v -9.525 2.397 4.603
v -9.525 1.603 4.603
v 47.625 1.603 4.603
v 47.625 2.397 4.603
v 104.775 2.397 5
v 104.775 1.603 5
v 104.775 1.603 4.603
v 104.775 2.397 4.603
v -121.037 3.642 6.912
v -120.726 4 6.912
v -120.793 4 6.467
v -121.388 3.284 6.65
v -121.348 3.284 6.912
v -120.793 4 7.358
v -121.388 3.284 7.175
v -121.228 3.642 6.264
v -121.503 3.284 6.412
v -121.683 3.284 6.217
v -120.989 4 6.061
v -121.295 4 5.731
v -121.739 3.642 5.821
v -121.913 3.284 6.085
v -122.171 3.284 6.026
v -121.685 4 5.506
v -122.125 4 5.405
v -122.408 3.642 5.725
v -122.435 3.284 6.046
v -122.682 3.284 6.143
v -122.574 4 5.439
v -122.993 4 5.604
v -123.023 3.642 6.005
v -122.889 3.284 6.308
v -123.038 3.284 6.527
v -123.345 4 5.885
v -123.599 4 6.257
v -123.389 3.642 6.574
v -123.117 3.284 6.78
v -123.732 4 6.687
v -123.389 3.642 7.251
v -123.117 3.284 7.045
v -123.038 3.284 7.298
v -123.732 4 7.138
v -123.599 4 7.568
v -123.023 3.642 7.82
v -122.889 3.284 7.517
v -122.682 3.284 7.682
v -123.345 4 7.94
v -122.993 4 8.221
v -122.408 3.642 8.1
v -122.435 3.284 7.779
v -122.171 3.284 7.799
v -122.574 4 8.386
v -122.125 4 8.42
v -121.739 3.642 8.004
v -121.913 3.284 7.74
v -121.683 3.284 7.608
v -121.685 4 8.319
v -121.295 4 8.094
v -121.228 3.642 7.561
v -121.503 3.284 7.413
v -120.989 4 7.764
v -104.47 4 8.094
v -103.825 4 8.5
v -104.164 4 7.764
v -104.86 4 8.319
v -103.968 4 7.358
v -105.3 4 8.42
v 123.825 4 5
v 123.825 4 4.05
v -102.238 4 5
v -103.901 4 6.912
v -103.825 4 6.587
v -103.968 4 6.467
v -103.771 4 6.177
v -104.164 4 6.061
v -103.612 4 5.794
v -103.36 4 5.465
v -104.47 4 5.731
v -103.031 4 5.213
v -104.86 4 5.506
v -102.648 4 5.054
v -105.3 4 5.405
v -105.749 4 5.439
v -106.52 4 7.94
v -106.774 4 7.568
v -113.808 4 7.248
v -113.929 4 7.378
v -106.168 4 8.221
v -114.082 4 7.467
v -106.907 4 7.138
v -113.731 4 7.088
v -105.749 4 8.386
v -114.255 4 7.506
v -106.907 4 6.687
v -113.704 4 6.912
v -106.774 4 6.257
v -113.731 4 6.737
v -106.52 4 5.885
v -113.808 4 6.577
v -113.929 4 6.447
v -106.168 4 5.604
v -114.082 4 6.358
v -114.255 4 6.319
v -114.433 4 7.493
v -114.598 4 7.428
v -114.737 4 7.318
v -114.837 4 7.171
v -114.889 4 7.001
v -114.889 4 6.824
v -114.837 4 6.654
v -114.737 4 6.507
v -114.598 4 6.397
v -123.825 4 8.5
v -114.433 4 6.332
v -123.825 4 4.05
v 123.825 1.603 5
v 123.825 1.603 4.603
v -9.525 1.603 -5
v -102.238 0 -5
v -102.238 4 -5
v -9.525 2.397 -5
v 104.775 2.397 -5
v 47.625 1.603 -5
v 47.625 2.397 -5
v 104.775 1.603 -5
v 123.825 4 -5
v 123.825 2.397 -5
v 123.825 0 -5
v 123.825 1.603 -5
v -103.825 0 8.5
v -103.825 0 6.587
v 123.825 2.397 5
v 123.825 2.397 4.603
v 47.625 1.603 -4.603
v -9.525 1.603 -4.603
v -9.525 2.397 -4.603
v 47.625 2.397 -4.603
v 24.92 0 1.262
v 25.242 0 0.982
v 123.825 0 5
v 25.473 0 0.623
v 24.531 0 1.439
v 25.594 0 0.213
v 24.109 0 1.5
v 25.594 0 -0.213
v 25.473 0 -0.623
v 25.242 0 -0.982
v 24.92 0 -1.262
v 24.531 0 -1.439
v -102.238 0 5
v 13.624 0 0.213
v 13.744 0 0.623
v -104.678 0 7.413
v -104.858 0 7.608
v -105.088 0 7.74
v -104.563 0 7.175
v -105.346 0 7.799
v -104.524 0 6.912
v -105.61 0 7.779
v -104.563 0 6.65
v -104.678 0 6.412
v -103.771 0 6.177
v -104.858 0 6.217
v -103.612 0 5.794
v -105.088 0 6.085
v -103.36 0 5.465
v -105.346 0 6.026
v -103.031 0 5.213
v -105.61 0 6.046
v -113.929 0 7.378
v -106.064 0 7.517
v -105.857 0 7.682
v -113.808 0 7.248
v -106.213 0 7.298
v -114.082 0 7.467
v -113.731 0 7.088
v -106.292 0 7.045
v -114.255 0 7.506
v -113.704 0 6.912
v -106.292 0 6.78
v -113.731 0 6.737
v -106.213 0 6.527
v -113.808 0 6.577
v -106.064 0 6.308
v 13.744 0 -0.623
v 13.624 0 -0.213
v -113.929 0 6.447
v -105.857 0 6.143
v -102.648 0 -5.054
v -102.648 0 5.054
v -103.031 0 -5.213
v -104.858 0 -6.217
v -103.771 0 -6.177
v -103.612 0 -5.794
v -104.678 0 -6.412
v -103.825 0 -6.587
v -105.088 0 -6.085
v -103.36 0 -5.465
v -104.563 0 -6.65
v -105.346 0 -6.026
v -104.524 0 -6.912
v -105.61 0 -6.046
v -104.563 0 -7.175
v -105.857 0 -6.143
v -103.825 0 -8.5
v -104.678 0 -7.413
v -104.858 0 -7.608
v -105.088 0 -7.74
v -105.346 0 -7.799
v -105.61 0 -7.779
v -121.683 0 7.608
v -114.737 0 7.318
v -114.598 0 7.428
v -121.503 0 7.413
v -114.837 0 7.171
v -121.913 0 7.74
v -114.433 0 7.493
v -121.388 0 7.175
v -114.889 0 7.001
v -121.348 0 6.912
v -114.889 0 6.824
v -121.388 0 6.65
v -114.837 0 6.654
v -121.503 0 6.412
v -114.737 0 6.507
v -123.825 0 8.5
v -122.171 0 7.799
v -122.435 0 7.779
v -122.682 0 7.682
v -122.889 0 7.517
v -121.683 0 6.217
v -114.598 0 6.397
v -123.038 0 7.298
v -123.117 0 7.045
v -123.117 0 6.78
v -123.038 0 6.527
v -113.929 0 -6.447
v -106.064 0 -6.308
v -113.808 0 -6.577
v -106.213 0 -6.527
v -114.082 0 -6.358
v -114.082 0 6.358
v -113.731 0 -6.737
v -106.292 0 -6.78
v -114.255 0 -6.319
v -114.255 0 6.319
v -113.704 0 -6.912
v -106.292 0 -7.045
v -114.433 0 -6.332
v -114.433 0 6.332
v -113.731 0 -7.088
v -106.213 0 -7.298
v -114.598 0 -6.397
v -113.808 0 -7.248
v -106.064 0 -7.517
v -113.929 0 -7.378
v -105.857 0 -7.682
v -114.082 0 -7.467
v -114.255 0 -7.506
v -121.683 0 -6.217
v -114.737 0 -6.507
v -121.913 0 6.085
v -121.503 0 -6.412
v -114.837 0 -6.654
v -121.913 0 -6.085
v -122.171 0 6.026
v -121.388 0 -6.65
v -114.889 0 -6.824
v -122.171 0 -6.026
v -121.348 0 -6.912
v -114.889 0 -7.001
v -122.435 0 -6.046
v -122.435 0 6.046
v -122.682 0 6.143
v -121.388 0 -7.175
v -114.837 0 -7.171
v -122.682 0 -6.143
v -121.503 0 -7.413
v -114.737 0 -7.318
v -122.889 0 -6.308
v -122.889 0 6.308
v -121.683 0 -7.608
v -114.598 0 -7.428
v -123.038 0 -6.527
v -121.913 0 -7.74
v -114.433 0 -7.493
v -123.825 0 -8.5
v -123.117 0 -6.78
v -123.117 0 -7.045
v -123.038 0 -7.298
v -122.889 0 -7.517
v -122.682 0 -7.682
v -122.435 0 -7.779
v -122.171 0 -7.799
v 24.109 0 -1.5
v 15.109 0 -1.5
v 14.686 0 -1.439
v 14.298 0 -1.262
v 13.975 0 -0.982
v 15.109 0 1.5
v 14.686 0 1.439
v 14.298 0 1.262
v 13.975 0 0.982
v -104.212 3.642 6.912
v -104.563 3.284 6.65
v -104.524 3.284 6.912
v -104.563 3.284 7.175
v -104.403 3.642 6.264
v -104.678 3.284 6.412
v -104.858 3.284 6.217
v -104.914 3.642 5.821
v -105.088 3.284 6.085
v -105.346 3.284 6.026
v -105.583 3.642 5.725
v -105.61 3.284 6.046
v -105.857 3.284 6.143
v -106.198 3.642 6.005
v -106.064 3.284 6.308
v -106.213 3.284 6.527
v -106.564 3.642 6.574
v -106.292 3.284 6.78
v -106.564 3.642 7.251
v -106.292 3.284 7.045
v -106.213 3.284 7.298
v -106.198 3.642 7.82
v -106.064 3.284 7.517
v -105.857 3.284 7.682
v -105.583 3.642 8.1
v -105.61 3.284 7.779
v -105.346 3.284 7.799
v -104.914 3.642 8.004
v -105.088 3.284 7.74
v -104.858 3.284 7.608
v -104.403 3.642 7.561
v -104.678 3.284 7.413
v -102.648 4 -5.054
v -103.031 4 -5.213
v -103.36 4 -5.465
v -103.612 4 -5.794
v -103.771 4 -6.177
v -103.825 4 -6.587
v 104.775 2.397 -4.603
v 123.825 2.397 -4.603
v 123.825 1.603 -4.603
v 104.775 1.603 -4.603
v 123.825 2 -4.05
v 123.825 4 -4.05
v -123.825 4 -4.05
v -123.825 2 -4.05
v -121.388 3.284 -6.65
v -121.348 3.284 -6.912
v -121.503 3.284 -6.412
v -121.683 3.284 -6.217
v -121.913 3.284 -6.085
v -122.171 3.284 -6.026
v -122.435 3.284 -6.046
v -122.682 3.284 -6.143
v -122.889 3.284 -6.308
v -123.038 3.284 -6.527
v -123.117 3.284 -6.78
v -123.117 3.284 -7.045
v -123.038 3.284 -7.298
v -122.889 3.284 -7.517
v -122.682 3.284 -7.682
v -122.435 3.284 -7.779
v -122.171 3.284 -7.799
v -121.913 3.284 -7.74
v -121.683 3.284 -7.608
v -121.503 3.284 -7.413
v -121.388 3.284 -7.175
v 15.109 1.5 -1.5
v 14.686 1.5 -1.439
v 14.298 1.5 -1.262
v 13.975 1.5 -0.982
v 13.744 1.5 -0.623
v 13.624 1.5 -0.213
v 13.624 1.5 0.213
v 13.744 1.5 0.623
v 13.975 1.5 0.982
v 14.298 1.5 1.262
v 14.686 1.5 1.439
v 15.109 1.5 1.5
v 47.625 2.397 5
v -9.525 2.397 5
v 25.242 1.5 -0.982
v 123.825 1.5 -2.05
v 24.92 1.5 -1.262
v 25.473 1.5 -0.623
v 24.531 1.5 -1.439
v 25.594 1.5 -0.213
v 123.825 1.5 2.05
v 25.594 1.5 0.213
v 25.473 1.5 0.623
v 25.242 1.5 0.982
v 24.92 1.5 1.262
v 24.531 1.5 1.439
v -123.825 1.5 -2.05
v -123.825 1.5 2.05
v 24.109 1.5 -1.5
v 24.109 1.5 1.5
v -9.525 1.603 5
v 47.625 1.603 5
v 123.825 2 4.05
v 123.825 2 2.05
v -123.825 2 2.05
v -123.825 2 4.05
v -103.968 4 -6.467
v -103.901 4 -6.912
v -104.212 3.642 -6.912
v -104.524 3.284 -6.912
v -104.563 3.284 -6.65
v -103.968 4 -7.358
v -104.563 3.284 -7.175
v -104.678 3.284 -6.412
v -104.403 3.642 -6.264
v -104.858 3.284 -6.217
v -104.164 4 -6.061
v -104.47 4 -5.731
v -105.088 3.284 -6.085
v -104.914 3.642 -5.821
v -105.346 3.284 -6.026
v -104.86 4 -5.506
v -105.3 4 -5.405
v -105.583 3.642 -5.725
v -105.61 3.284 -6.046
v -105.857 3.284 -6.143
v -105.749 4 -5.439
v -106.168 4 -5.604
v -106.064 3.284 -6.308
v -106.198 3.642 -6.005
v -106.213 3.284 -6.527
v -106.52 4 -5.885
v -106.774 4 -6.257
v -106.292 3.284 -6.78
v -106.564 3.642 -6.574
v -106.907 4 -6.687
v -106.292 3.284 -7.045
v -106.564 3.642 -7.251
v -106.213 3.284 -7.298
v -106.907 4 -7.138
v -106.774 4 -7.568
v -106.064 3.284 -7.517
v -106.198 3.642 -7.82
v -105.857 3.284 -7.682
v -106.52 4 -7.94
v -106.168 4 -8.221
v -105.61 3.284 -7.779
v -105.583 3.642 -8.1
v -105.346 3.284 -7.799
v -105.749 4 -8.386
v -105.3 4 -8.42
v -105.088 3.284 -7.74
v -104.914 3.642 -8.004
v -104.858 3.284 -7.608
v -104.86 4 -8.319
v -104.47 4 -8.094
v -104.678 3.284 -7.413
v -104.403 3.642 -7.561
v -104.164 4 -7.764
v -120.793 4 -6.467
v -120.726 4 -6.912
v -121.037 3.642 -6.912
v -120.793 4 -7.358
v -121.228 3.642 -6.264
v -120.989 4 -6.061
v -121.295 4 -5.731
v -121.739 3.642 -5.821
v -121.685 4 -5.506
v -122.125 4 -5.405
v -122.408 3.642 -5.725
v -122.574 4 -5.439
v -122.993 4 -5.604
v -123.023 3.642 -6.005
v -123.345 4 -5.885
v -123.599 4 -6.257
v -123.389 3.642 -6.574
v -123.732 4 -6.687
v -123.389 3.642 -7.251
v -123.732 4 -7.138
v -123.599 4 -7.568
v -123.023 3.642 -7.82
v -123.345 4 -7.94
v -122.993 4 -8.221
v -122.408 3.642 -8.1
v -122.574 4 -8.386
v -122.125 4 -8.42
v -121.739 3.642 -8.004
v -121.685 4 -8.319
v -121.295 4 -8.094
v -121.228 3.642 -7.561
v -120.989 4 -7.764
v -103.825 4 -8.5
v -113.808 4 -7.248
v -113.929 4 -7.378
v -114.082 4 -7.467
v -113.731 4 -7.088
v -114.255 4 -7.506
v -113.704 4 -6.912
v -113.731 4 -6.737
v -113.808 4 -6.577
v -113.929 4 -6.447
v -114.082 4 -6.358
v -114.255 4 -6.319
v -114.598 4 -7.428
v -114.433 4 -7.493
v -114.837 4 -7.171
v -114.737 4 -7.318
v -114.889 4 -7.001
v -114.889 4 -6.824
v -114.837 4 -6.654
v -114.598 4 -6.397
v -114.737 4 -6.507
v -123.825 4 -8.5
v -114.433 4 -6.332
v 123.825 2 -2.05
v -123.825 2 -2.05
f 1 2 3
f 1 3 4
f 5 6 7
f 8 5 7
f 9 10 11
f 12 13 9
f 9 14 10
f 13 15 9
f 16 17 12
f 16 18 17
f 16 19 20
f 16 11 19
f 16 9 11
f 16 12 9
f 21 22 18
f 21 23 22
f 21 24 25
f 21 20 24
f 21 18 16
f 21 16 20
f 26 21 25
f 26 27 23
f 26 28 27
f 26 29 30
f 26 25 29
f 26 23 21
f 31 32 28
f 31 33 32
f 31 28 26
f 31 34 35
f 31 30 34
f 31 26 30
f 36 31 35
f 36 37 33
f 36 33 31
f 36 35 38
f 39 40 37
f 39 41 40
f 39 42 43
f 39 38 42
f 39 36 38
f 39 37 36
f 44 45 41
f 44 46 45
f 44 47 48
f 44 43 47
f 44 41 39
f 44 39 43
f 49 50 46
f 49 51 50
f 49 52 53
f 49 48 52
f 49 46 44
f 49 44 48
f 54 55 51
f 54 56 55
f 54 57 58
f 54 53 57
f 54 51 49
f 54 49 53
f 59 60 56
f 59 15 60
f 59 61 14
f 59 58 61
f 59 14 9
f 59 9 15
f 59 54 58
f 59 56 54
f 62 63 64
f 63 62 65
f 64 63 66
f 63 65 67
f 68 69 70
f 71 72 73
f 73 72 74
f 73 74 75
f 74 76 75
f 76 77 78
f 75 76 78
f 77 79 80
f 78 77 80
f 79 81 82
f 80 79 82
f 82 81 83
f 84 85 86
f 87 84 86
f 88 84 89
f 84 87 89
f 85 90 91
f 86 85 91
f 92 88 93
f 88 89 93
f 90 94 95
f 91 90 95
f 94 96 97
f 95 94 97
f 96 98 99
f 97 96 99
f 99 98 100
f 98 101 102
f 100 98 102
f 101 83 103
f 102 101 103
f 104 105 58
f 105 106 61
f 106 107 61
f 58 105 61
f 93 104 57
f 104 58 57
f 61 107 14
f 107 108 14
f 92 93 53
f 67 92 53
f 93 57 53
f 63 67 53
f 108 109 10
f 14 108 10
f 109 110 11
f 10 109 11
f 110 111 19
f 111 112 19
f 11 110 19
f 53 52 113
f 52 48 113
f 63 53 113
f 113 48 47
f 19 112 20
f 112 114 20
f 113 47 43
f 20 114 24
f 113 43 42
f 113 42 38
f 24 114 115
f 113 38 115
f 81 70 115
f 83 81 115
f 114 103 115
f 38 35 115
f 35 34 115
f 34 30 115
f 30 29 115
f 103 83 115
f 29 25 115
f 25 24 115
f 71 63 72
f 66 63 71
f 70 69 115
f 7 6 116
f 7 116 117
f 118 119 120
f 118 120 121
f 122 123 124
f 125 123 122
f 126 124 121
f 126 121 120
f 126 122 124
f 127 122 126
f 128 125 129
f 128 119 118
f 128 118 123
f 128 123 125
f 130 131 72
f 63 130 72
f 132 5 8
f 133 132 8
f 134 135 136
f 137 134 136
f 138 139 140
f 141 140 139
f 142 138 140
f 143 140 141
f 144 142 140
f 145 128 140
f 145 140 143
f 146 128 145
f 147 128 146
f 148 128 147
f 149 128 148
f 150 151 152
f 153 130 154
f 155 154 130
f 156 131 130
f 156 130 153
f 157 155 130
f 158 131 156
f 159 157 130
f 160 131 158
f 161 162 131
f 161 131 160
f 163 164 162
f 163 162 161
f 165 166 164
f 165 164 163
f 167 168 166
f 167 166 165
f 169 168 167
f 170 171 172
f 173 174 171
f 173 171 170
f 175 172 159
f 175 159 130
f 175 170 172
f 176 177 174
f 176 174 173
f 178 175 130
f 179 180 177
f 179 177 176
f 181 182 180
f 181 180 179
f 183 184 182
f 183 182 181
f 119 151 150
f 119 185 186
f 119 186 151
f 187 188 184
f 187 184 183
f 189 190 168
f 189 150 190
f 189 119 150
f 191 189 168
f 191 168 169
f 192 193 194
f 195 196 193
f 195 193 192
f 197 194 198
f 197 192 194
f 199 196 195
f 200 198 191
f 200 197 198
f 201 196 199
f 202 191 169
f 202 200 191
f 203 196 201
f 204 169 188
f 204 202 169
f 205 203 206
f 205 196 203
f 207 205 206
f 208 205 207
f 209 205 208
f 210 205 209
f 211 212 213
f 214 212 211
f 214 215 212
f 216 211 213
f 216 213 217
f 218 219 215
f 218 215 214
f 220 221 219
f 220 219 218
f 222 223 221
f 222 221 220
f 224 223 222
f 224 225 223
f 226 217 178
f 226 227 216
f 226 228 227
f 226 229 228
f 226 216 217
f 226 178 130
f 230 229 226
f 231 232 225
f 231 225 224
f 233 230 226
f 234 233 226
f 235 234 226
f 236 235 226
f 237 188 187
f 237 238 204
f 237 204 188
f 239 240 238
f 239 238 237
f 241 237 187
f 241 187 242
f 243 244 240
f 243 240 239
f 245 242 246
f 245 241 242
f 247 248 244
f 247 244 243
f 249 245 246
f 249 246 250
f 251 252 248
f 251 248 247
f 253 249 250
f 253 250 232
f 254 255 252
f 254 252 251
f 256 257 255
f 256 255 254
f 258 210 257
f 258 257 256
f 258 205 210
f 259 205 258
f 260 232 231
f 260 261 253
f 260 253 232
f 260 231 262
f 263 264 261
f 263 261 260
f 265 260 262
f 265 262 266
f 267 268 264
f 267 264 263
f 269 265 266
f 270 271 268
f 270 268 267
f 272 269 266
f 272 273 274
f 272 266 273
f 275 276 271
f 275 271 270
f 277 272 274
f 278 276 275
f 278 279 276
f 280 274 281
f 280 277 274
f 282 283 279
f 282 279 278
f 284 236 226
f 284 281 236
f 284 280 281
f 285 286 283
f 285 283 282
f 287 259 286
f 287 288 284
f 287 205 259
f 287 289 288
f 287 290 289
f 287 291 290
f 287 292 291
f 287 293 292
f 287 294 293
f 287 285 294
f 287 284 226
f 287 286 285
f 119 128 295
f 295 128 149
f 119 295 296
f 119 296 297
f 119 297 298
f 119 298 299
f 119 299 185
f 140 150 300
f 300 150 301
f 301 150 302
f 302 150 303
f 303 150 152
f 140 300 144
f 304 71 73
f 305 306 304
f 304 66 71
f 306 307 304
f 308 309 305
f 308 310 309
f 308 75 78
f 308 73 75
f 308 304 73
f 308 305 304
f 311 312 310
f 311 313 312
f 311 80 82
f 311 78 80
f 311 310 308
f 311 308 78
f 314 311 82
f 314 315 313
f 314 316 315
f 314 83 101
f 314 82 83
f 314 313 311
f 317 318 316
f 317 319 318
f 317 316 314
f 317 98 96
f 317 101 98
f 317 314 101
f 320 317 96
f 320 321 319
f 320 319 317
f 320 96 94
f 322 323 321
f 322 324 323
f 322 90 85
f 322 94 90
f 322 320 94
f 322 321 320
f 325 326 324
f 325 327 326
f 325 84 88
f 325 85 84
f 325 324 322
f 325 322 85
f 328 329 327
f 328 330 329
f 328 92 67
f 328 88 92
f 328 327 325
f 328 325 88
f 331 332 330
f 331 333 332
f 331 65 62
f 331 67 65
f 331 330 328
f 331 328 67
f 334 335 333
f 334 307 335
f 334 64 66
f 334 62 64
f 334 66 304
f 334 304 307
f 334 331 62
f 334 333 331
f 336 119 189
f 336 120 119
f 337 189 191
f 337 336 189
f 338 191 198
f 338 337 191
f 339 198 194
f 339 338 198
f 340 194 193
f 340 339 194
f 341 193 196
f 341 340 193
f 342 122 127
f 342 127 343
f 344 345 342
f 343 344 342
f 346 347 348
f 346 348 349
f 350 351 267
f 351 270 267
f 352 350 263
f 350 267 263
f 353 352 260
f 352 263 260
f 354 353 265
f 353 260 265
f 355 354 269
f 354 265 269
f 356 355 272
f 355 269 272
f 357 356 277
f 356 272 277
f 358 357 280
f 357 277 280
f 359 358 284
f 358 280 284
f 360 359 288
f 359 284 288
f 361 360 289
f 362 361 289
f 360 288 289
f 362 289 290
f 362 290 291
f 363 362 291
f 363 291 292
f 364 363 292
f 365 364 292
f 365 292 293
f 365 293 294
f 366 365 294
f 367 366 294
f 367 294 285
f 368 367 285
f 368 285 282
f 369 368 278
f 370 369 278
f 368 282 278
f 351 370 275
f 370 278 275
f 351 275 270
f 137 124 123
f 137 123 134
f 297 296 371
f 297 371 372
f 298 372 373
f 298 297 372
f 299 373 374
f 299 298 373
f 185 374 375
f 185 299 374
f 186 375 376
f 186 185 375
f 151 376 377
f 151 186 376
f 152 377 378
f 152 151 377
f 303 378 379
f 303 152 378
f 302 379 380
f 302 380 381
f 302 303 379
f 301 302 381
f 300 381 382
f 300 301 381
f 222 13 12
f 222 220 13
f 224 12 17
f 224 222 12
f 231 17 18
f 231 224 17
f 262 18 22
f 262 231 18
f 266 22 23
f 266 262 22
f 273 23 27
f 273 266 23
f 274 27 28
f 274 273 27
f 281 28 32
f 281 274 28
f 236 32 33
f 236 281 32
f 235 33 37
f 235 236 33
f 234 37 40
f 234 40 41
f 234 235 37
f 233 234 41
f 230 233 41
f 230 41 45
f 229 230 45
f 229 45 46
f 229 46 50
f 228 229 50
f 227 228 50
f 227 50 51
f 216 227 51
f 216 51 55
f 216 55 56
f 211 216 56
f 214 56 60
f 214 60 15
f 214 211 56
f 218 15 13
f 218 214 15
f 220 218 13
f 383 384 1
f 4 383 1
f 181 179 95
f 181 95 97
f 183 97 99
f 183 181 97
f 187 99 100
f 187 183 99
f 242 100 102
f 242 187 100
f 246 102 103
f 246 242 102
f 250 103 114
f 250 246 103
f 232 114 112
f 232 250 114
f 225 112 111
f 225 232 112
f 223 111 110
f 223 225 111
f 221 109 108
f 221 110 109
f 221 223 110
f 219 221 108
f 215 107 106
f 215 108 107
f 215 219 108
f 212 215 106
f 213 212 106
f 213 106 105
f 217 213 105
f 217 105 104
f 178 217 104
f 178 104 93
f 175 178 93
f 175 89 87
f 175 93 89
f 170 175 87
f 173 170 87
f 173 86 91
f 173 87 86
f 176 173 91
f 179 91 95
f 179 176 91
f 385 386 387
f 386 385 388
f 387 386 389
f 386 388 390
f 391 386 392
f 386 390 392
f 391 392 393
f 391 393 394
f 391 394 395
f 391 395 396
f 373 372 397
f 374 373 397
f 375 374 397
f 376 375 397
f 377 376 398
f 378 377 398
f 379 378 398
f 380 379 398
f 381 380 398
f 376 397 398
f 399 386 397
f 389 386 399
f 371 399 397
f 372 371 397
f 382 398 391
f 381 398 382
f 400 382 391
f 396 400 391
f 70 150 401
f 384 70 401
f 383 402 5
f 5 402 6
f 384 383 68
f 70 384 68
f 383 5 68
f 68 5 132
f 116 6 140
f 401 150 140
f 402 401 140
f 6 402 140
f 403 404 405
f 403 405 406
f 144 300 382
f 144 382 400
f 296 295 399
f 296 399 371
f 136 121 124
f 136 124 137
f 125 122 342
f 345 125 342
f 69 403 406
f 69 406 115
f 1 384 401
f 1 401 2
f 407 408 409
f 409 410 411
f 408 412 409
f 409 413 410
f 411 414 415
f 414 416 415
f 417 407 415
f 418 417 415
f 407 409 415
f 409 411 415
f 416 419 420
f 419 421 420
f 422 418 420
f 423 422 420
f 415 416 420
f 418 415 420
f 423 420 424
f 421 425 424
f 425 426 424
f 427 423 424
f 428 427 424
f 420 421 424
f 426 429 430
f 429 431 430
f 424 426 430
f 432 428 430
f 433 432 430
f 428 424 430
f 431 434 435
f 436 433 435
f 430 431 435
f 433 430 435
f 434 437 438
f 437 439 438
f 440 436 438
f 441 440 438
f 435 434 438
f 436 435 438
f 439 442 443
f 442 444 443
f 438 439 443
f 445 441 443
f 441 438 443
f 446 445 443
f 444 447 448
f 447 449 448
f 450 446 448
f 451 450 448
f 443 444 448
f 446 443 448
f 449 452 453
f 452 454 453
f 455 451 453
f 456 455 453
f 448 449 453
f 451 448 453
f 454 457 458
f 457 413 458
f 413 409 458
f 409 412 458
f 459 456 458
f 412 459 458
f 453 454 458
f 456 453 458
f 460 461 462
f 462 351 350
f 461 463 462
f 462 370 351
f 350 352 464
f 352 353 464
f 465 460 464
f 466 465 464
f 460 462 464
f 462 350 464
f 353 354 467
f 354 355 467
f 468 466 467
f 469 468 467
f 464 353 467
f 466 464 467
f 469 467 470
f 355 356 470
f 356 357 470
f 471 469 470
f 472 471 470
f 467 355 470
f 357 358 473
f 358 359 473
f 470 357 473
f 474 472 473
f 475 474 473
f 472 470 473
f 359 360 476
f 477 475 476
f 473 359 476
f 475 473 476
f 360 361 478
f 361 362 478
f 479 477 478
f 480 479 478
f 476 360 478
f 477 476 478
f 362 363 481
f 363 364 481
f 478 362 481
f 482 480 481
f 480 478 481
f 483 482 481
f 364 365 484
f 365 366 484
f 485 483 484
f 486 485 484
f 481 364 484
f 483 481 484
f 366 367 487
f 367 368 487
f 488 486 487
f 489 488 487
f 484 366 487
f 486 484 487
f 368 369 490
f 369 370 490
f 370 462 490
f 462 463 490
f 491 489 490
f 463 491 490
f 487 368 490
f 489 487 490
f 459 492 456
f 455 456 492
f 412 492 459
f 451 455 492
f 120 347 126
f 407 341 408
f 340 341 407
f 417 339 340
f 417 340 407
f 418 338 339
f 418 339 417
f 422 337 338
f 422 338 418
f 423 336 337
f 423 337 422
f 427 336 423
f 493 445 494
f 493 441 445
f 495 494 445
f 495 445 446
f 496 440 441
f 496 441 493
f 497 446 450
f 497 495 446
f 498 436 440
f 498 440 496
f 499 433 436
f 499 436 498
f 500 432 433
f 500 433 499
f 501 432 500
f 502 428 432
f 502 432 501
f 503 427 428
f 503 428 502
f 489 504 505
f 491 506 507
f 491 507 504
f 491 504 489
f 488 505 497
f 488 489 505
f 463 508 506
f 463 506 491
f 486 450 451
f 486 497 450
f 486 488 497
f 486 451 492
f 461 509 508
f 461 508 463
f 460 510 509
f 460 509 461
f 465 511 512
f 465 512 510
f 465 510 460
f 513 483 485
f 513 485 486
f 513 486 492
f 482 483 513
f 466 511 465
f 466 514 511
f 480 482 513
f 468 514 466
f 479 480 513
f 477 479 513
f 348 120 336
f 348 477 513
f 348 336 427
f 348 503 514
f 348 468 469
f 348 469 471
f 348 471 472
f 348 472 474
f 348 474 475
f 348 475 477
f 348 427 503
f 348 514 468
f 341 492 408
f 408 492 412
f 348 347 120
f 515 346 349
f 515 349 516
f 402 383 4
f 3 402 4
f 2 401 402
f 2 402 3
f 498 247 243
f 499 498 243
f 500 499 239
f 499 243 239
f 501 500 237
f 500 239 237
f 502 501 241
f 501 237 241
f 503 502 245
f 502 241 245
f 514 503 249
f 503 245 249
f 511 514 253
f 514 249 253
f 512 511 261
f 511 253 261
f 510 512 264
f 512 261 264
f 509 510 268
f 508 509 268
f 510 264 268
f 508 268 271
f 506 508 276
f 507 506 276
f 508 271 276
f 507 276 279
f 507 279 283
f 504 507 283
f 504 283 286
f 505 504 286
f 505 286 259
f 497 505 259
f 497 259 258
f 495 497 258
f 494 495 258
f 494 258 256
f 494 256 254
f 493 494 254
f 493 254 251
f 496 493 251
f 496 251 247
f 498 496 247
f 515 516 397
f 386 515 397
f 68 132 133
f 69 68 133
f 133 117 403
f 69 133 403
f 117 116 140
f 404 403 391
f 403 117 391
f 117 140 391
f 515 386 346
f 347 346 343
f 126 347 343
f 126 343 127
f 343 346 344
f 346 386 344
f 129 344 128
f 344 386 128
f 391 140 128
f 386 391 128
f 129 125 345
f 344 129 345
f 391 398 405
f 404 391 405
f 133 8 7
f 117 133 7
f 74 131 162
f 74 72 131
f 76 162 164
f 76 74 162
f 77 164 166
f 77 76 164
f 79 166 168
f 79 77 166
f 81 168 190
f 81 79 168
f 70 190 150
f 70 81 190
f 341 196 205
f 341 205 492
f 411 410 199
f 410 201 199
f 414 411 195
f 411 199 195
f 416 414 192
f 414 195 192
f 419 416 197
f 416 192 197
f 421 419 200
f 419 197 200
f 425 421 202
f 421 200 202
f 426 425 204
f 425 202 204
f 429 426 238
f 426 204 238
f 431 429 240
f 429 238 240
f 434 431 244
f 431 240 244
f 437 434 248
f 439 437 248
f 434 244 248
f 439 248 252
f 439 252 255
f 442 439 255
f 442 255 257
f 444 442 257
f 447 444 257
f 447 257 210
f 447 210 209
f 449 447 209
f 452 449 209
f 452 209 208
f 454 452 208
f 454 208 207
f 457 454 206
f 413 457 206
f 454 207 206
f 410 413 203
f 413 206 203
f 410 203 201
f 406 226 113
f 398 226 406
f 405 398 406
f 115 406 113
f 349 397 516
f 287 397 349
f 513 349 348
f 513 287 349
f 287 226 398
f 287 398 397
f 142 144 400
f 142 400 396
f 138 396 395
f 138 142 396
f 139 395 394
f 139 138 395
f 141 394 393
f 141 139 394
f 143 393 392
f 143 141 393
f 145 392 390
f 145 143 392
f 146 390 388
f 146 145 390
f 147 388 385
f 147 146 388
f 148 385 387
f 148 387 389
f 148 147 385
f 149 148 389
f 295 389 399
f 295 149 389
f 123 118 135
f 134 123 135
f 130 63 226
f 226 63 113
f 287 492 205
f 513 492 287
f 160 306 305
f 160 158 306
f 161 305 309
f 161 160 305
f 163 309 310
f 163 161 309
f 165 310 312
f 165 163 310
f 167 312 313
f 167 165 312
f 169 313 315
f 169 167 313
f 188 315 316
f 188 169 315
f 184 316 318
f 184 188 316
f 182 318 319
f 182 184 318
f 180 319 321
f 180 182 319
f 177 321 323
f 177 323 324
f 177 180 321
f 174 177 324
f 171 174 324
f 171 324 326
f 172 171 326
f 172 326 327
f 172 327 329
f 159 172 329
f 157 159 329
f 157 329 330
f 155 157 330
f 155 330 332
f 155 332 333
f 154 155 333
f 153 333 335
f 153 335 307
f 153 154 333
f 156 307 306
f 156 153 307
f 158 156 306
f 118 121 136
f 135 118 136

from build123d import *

# Parameters (mm, degrees)
SKETCH1_W                                      = 247.65
SKETCH1_H                                      = 10
BOSS_EXTRUDE1_DEPTH                            = 4
CUT_EXTRUDE1_DEPTH                             = 248.732764284
CUT_EXTRUDE2_DEPTH                             = 1.5
CUT_EXTRUDE3_START                             = -114.3
SKETCH13_W                                     = 0.79375
SKETCH13_H                                     = 0.79375
CUT_EXTRUDE3_DEPTH                             = 57.15
LPATTERN1_COUNT                                = 2
LPATTERN1_PITCH                                = 114.3
SKETCH14_W                                     = 20
SKETCH14_H                                     = 4
BOSS_EXTRUDE3_DEPTH                            = 3.5
F_0_80_TAPPED_HOLE2_D                          = 1.19126
CSK_FOR_0_FLAT_HEAD_MACHINE_SCREW1_D           = 1.778
CSK_FOR_0_FLAT_HEAD_MACHINE_SCREW1_CSINK_D     = 3.0226
CSK_FOR_0_FLAT_HEAD_MACHINE_SCREW1_CSINK_ANGLE = 82
MIRROR3_START                                  = -114.3
MIRROR3_COPY_1_SKETCH_W                        = 0.79375
MIRROR3_COPY_1_SKETCH_H                        = 0.79375
MIRROR3_COPY_1_DEPTH                           = 57.15
FILLET6_R                                      = 1.5875


# Read off the part's stored shape, not the designer's step: Cut-Extrude2
with BuildPart() as part:
    # Sketch1 → Boss-Extrude1 (new body)
    with BuildSketch(Plane(origin=(0, 0, 0), x_dir=(1, 0, 0), z_dir=(0, 1, 0))):
        Rectangle(SKETCH1_W, SKETCH1_H)
    extrude(amount=BOSS_EXTRUDE1_DEPTH)

    # Sketch2 → Cut-Extrude1 (cut, through all)
    with BuildSketch(Plane.ZY.offset(123.825)):
        Polygon((-2.05, 1.5), (2.05, 1.5), (2.05, 2), (4.05, 2), (4.05, 4), (-4.05, 4), (-4.05, 2), (-2.05, 2), align=None)
    extrude(amount=-CUT_EXTRUDE1_DEPTH, mode=Mode.SUBTRACT)

    # Cut-Extrude2 outline → Cut-Extrude2 (cut)
    with BuildSketch(Plane(origin=(0, 0, 0), x_dir=(1, 0, 0), z_dir=(0, 1, 0))):
        with BuildLine():
            Line((24.1088, 1.5), (15.1088, 1.5))
            ThreePointArc((15.1088, 1.5), (13.6088, 0), (15.1088, -1.5))
            Line((15.1088, -1.5), (24.1088, -1.5))
            ThreePointArc((24.1088, -1.5), (25.6088, 0), (24.1088, 1.5))
        make_face()
    extrude(amount=CUT_EXTRUDE2_DEPTH, mode=Mode.SUBTRACT)

    # Sketch13 → Cut-Extrude3 (cut)
    with BuildSketch(Plane.ZY.offset(123.825).offset(CUT_EXTRUDE3_START)):
        with Locations((-5, 2)):
            Rectangle(SKETCH13_W, SKETCH13_H)
    cut_extrude3 = extrude(amount=-CUT_EXTRUDE3_DEPTH, mode=Mode.SUBTRACT)

    # LPattern1: Cut-Extrude3 ×2
    with Locations(*[(i * LPATTERN1_PITCH, 0, 0) for i in range(1, LPATTERN1_COUNT)]):
        add(cut_extrude3, mode=Mode.SUBTRACT)

    # Sketch14 → Boss-Extrude3 (add)
    with BuildSketch(Plane(origin=(0, 0, -5), x_dir=(-1, 0, 0), z_dir=(0, 0, -1))):
        with Locations((113.825, 2)):
            Rectangle(SKETCH14_W, SKETCH14_H)
    boss_extrude3 = extrude(amount=BOSS_EXTRUDE3_DEPTH)

    # #0-80 Tapped Hole2 (through all)
    with Locations(Plane(origin=(0, 4, 0), x_dir=(-1, 0, 0), z_dir=(0, 1, 0))):
        with Locations((114.3, -6.9125)):
            f_0_80_tapped_hole2 = Hole(F_0_80_TAPPED_HOLE2_D / 2)

    # CSK for #0 Flat Head Machine Screw1 (through all)
    with Locations(Plane(origin=(0, 4, 0), x_dir=(-1, 0, 0), z_dir=(0, 1, 0))):
        with Locations((105.4125, -6.9125), (122.2375, -6.9125)):
            csk_for_0_flat_head_machine_screw1 = CounterSinkHole(CSK_FOR_0_FLAT_HEAD_MACHINE_SCREW1_D / 2, CSK_FOR_0_FLAT_HEAD_MACHINE_SCREW1_CSINK_D / 2, counter_sink_angle=CSK_FOR_0_FLAT_HEAD_MACHINE_SCREW1_CSINK_ANGLE)

    # Mirror3: Cut-Extrude3, Boss-Extrude3, #0-80 Tapped Hole2, CSK for #0 Flat Head Machine Screw1 across plane
    add(cut_extrude3.mirror(Plane.XY), mode=Mode.SUBTRACT)
    add(boss_extrude3.mirror(Plane.XY))
    add(f_0_80_tapped_hole2.mirror(Plane.XY), mode=Mode.SUBTRACT)
    add(csk_for_0_flat_head_machine_screw1.mirror(Plane.XY), mode=Mode.SUBTRACT)

    # Mirror3 copy 1 sketch → Mirror3 copy 1 (cut)
    with BuildSketch(Plane(origin=(-9.525, 0, 0), x_dir=(0, 0, -1), z_dir=(-1, 0, 0)).offset(MIRROR3_START)):
        with Locations((-5, -2)):
            Rectangle(MIRROR3_COPY_1_SKETCH_W, MIRROR3_COPY_1_SKETCH_H)
    extrude(amount=-MIRROR3_COPY_1_DEPTH, mode=Mode.SUBTRACT)

    # Fillet6
    fillet6_edges = [part.edges().sort_by_distance(p)[0] for p in [
        (-103.825, 2, -5),
        (-103.825, 2, 5),
    ]]
    fillet(fillet6_edges, radius=FILLET6_R)


solid = part.part
